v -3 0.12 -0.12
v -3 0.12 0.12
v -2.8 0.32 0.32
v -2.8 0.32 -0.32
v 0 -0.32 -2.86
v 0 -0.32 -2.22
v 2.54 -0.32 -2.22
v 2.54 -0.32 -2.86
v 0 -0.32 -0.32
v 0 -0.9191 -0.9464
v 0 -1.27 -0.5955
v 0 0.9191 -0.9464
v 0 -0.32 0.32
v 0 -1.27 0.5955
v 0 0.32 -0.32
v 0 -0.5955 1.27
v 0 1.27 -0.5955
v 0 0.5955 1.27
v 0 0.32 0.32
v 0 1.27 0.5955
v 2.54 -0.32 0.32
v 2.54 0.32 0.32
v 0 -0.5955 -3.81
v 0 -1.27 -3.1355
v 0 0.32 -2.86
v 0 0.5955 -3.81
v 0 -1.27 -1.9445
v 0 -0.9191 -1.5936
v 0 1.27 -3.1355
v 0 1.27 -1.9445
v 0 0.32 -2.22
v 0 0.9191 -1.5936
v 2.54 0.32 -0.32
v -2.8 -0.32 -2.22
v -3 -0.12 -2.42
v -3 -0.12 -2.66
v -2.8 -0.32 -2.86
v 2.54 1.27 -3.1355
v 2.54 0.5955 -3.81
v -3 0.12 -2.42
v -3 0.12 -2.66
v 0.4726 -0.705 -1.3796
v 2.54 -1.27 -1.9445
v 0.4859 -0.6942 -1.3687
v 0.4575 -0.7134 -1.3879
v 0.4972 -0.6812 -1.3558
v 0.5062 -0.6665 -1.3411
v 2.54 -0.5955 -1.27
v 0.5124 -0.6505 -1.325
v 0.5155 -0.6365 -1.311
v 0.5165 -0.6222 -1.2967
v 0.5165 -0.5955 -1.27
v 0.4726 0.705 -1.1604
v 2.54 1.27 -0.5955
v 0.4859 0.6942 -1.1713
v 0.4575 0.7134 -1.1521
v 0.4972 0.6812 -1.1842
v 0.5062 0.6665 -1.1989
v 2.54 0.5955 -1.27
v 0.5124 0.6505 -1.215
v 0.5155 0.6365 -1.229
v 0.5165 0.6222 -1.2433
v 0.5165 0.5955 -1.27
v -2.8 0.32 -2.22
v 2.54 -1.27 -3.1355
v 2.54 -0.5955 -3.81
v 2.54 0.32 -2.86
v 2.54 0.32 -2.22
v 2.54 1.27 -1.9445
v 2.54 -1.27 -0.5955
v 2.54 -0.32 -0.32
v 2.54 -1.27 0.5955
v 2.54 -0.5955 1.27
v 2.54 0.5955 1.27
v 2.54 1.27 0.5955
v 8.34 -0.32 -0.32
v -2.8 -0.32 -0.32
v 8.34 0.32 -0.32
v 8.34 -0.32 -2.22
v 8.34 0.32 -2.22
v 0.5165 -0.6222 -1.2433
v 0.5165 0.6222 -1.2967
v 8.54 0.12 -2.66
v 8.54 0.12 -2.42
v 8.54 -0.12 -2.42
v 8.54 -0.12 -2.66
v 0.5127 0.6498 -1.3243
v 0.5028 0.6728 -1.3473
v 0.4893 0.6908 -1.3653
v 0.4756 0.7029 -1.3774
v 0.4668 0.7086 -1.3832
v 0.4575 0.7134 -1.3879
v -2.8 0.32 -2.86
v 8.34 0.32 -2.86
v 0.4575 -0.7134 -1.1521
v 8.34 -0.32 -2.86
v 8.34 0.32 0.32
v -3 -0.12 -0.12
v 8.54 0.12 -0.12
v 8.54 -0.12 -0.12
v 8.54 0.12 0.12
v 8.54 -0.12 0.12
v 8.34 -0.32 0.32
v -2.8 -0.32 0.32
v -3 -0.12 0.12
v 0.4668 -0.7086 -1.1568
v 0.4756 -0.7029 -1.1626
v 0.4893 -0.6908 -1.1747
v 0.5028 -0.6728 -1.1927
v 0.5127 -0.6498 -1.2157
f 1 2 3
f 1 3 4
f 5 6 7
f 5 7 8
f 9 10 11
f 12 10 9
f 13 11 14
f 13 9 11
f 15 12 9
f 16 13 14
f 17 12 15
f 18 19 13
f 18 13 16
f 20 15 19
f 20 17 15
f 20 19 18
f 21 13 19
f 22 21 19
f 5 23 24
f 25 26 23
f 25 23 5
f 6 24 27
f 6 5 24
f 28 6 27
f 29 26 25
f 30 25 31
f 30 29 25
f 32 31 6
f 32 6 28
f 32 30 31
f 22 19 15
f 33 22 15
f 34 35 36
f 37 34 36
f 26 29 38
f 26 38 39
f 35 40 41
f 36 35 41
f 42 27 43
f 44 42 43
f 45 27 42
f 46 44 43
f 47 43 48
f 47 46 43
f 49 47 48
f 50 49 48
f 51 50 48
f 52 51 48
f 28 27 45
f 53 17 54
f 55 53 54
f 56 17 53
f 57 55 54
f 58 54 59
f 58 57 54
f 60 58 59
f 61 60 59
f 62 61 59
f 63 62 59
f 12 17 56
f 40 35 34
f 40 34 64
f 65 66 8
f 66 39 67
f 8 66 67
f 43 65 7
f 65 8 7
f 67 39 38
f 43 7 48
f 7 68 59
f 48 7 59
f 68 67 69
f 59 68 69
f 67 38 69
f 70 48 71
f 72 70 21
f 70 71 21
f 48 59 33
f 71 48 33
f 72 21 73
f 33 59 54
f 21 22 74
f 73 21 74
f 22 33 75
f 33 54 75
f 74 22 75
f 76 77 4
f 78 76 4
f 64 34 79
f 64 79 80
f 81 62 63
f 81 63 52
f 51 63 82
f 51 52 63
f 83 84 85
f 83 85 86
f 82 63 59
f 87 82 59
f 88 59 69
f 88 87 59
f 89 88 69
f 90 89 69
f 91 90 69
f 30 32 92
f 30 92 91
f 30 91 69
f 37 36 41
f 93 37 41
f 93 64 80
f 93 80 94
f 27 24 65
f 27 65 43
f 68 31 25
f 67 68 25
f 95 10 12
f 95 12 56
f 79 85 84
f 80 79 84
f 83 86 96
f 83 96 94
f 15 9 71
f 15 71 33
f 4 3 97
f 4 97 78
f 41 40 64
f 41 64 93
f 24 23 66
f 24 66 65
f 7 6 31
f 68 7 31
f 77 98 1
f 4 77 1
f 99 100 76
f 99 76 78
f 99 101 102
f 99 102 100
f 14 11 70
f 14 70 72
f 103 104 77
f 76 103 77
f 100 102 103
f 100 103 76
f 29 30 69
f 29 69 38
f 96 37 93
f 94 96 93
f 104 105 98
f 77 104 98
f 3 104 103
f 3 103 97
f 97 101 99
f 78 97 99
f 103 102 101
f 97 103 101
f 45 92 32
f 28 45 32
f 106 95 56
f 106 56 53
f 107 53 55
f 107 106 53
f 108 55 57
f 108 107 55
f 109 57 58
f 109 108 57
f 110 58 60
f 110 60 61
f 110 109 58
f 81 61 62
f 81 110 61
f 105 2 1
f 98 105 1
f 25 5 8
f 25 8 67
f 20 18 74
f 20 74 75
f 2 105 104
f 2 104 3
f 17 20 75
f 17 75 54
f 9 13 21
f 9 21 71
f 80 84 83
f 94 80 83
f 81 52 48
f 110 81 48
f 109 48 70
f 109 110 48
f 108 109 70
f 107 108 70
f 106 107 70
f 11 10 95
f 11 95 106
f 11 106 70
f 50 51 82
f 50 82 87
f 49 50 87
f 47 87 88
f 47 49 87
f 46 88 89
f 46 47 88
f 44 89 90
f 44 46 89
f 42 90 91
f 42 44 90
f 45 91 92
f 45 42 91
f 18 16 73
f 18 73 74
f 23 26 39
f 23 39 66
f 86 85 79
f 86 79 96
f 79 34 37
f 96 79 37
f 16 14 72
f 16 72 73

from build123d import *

# Parameters (mm, degrees)
CROQUIS1_W                     = 0.64
CROQUIS1_H                     = 0.64
SALIENTE_EXTRUIR1_DEPTH        = 2.54
CORTAR_EXTRUIR1_DEPTH          = 2.54
CORTAR_EXTRUIR1_DEPTH_BACK     = 2.54
SALIENTE_EXTRUIR2_DEPTH        = 8.54
SALIENTE_EXTRUIR2_DEPTH_BACK   = 3
CROQUIS3_W                     = 0.64
CROQUIS3_H                     = 0.64
SALIENTE_EXTRUIR2_2_DEPTH      = 8.54
SALIENTE_EXTRUIR2_2_DEPTH_BACK = 3
CHAFL_N1_SIZE                  = 0.2
CHAFL_N2_SIZE                  = 0.2


with BuildPart() as part:
    # Croquis1 → Saliente-Extruir1 (new body)
    with BuildSketch(Plane(origin=(0, 0, 0), x_dir=(0, 0, -1), z_dir=(1, 0, 0))):
        Polygon((0.595482683, 1.27), (-0.595482683, 1.27), (-1.27, 0.595482683), (-1.27, -0.595482683), (-0.595482683, -1.27), (0.595482683, -1.27), (1.27, -0.595482683), (1.944517317, -1.27), (3.135482683, -1.27), (3.81, -0.595482683), (3.81, 0.595482683), (3.135482683, 1.27), (1.944517317, 1.27), (1.27, 0.595482683), align=None)
        Rectangle(CROQUIS1_W, CROQUIS1_H, mode=Mode.SUBTRACT)
        with Locations((2.54, 0)):
            Rectangle(CROQUIS1_W, CROQUIS1_H, mode=Mode.SUBTRACT)
    extrude(amount=SALIENTE_EXTRUIR1_DEPTH)

    # Croquis2 → Cortar-Extruir1 (cut, two sides: drawn at the far end of the back side and taken through both)
    with BuildSketch(Plane(origin=(0, 0, 0), x_dir=(1, 0, 0), z_dir=(0, 1, 0)).offset(-CORTAR_EXTRUIR1_DEPTH_BACK)):
        with BuildLine():
            Line((0.516526244, 1.243275937), (0.516526244, 1.296724063))
            ThreePointArc((0.516526244, 1.296724063), (0.500491193, 1.351036929), (0.457528496, 1.387931603))
            Line((0.457528496, 1.387931603), (0, 1.593613049))
            Line((0, 1.593613049), (0, 0.946386951))
            Line((0, 0.946386951), (0.457528496, 1.152068397))
            ThreePointArc((0.457528496, 1.152068397), (0.500491193, 1.188963071), (0.516526244, 1.243275937))
        make_face()
    extrude(amount=CORTAR_EXTRUIR1_DEPTH + CORTAR_EXTRUIR1_DEPTH_BACK, mode=Mode.SUBTRACT)


with BuildPart() as body_2:
    # Croquis3 → Saliente-Extruir2 (new, two sides: drawn at the far end of the back side and taken through both)
    with BuildSketch(Plane(origin=(0, 0, 0), x_dir=(0, 0, -1), z_dir=(1, 0, 0)).offset(-SALIENTE_EXTRUIR2_DEPTH_BACK)):
        Rectangle(CROQUIS3_W, CROQUIS3_H)
    extrude(amount=SALIENTE_EXTRUIR2_DEPTH + SALIENTE_EXTRUIR2_DEPTH_BACK)

    # Chaflán1
    chafl_n1_edges = [body_2.edges().sort_by_distance(p)[0] for p in [
        (-3, -0.32, 0),
        (-3, 0, -0.32),
        (-3, 0.32, 0),
        (-3, 0, 0.32),
        (8.54, 0.32, 0),
        (8.54, 0, -0.32),
        (8.54, -0.32, 0),
        (8.54, 0, 0.32),
    ]]
    chamfer(chafl_n1_edges, length=CHAFL_N1_SIZE)


with BuildPart() as body_3:
    # Croquis3 → Saliente-Extruir2 2 (new, two sides: drawn at the far end of the back side and taken through both)
    with BuildSketch(Plane(origin=(0, 0, 0), x_dir=(0, 0, -1), z_dir=(1, 0, 0)).offset(-SALIENTE_EXTRUIR2_2_DEPTH_BACK)):
        with Locations((2.54, 0)):
            Rectangle(CROQUIS3_W, CROQUIS3_H)
    extrude(amount=SALIENTE_EXTRUIR2_2_DEPTH + SALIENTE_EXTRUIR2_2_DEPTH_BACK)

    # Chaflán2
    chafl_n2_edges = [body_3.edges().sort_by_distance(p)[0] for p in [
        (8.54, 0.32, -2.54),
        (8.54, 0, -2.86),
        (8.54, -0.32, -2.54),
        (8.54, 0, -2.22),
        (-3, -0.32, -2.54),
        (-3, 0, -2.86),
        (-3, 0.32, -2.54),
        (-3, 0, -2.22),
    ]]
    chamfer(chafl_n2_edges, length=CHAFL_N2_SIZE)


solid = Compound([part.part, body_2.part, body_3.part])
